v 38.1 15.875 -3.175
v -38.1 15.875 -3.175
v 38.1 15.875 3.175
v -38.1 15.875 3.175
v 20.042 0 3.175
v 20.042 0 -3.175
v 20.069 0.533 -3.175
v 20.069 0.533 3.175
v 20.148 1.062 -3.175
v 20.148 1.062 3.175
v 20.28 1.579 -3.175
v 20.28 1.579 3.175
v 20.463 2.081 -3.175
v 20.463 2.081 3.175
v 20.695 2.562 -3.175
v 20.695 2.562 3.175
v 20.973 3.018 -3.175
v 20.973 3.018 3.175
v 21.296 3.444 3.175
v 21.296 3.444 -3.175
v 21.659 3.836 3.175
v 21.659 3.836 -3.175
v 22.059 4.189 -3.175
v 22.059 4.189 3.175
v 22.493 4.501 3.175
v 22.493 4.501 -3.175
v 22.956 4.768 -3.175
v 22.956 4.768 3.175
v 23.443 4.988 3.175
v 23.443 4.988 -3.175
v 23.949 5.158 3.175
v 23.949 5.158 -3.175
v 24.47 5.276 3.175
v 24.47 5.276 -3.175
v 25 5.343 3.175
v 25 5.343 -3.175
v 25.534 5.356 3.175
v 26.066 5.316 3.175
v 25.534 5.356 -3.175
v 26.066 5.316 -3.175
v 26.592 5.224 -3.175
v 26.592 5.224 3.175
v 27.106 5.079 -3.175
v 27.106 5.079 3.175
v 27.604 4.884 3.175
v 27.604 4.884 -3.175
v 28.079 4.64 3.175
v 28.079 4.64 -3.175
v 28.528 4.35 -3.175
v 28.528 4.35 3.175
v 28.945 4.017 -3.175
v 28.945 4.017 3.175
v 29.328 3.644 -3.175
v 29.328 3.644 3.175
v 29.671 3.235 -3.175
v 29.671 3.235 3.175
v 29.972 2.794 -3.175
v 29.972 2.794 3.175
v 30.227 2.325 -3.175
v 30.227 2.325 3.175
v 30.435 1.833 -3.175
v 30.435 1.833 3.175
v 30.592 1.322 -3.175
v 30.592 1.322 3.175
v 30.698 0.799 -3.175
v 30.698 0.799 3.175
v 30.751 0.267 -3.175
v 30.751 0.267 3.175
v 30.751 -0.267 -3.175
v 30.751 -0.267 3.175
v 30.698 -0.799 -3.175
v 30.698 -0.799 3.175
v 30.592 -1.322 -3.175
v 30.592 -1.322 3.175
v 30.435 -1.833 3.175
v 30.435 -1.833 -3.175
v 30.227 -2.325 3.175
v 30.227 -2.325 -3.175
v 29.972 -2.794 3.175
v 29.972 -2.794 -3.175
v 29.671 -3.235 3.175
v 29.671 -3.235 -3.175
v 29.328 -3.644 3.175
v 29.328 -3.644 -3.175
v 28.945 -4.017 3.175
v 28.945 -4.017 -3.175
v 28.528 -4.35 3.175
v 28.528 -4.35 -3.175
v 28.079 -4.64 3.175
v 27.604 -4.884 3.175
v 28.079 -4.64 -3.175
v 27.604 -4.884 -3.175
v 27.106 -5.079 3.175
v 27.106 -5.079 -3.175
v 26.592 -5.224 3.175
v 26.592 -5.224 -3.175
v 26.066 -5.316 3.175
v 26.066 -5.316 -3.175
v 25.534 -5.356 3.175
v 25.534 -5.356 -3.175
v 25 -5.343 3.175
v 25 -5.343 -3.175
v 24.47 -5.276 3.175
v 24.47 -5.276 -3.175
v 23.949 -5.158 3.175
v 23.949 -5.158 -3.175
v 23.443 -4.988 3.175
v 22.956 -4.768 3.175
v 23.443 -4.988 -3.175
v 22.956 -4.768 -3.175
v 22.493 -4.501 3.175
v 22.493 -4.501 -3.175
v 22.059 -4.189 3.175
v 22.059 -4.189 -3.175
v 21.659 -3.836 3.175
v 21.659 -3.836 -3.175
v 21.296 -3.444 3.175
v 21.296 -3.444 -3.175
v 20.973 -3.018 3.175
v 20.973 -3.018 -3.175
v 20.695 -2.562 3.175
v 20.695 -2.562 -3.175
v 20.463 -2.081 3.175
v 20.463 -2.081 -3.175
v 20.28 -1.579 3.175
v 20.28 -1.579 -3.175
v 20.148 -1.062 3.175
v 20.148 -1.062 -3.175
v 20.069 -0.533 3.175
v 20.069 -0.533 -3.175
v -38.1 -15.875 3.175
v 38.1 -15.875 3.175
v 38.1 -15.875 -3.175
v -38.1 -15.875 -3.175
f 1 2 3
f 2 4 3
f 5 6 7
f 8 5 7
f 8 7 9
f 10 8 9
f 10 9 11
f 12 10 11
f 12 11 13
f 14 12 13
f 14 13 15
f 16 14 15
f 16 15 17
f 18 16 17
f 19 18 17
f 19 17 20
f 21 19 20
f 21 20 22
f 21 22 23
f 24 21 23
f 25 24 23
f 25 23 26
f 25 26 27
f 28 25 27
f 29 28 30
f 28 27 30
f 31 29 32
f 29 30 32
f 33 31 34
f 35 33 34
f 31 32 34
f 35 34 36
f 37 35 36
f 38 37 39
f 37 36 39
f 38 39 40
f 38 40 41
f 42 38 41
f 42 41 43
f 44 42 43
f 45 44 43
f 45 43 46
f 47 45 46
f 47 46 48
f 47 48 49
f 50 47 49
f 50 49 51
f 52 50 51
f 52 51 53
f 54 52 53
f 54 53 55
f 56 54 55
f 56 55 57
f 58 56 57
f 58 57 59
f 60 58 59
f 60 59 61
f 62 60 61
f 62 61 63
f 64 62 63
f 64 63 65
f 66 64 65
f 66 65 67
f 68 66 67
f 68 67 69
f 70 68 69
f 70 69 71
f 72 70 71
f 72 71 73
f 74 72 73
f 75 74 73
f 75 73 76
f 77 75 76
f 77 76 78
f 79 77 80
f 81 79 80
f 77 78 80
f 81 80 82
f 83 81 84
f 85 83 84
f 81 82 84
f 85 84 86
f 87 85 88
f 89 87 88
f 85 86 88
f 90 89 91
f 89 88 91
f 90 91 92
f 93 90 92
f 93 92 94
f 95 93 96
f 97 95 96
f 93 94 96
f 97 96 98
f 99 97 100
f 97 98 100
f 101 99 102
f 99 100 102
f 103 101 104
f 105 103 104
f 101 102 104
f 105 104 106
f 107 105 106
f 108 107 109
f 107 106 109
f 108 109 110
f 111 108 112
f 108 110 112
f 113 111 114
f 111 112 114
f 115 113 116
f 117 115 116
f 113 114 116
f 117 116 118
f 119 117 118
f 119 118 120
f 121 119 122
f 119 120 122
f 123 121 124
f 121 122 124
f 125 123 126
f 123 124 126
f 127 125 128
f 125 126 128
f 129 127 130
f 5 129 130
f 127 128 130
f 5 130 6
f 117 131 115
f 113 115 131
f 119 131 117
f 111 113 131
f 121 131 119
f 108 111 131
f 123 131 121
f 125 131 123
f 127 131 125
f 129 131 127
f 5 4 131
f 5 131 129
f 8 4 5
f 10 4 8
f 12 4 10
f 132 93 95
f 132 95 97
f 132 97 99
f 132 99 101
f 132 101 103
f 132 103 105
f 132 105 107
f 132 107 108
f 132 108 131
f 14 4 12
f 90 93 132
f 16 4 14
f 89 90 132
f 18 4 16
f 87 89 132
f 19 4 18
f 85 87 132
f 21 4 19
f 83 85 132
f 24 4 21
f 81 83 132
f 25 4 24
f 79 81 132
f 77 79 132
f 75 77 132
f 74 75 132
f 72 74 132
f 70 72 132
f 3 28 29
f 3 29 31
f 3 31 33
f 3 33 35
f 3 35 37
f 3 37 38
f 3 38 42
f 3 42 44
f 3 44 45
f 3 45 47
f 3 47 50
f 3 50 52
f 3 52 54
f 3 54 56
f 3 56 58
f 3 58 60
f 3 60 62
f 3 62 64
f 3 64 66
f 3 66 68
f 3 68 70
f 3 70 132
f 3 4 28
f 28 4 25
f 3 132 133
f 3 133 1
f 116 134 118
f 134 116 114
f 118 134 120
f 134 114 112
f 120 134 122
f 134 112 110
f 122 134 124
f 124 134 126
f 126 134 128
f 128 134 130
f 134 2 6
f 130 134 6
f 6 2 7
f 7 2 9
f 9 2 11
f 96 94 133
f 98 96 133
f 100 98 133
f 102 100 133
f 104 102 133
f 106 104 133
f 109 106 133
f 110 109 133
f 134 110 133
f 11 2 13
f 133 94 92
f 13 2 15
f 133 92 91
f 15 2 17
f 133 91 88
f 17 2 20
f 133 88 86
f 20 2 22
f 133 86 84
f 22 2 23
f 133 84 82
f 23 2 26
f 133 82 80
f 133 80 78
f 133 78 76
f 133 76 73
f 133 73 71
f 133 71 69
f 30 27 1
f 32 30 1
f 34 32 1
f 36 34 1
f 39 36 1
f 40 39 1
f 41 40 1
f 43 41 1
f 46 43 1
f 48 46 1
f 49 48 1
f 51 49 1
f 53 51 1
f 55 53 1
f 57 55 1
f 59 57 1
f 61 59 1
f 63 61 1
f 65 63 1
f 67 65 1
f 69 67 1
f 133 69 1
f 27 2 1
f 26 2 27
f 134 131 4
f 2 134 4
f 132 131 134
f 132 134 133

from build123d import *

# Parameters (mm, degrees)
SKETCH1_W                        = 76.2
SKETCH1_H                        = 31.75
EXTRUDE1_DEPTH                   = 3.175
F_27_64_0_42188_DIAMETER_HOLE1_D = 10.715752


with BuildPart() as part:
    # Sketch1 → Extrude1 (new, symmetric)
    with BuildSketch(Plane.XY):
        Rectangle(SKETCH1_W, SKETCH1_H)
    extrude(amount=EXTRUDE1_DEPTH, both=True)

    # 27/64 (0.42188) Diameter Hole1 (through all)
    with Locations(Plane(origin=(25.4, 0, 3.175), x_dir=(1, 0, 0), z_dir=(0, 0, 1))):
        with Locations((0, 0)):
            Hole(F_27_64_0_42188_DIAMETER_HOLE1_D / 2)


solid = part.part
